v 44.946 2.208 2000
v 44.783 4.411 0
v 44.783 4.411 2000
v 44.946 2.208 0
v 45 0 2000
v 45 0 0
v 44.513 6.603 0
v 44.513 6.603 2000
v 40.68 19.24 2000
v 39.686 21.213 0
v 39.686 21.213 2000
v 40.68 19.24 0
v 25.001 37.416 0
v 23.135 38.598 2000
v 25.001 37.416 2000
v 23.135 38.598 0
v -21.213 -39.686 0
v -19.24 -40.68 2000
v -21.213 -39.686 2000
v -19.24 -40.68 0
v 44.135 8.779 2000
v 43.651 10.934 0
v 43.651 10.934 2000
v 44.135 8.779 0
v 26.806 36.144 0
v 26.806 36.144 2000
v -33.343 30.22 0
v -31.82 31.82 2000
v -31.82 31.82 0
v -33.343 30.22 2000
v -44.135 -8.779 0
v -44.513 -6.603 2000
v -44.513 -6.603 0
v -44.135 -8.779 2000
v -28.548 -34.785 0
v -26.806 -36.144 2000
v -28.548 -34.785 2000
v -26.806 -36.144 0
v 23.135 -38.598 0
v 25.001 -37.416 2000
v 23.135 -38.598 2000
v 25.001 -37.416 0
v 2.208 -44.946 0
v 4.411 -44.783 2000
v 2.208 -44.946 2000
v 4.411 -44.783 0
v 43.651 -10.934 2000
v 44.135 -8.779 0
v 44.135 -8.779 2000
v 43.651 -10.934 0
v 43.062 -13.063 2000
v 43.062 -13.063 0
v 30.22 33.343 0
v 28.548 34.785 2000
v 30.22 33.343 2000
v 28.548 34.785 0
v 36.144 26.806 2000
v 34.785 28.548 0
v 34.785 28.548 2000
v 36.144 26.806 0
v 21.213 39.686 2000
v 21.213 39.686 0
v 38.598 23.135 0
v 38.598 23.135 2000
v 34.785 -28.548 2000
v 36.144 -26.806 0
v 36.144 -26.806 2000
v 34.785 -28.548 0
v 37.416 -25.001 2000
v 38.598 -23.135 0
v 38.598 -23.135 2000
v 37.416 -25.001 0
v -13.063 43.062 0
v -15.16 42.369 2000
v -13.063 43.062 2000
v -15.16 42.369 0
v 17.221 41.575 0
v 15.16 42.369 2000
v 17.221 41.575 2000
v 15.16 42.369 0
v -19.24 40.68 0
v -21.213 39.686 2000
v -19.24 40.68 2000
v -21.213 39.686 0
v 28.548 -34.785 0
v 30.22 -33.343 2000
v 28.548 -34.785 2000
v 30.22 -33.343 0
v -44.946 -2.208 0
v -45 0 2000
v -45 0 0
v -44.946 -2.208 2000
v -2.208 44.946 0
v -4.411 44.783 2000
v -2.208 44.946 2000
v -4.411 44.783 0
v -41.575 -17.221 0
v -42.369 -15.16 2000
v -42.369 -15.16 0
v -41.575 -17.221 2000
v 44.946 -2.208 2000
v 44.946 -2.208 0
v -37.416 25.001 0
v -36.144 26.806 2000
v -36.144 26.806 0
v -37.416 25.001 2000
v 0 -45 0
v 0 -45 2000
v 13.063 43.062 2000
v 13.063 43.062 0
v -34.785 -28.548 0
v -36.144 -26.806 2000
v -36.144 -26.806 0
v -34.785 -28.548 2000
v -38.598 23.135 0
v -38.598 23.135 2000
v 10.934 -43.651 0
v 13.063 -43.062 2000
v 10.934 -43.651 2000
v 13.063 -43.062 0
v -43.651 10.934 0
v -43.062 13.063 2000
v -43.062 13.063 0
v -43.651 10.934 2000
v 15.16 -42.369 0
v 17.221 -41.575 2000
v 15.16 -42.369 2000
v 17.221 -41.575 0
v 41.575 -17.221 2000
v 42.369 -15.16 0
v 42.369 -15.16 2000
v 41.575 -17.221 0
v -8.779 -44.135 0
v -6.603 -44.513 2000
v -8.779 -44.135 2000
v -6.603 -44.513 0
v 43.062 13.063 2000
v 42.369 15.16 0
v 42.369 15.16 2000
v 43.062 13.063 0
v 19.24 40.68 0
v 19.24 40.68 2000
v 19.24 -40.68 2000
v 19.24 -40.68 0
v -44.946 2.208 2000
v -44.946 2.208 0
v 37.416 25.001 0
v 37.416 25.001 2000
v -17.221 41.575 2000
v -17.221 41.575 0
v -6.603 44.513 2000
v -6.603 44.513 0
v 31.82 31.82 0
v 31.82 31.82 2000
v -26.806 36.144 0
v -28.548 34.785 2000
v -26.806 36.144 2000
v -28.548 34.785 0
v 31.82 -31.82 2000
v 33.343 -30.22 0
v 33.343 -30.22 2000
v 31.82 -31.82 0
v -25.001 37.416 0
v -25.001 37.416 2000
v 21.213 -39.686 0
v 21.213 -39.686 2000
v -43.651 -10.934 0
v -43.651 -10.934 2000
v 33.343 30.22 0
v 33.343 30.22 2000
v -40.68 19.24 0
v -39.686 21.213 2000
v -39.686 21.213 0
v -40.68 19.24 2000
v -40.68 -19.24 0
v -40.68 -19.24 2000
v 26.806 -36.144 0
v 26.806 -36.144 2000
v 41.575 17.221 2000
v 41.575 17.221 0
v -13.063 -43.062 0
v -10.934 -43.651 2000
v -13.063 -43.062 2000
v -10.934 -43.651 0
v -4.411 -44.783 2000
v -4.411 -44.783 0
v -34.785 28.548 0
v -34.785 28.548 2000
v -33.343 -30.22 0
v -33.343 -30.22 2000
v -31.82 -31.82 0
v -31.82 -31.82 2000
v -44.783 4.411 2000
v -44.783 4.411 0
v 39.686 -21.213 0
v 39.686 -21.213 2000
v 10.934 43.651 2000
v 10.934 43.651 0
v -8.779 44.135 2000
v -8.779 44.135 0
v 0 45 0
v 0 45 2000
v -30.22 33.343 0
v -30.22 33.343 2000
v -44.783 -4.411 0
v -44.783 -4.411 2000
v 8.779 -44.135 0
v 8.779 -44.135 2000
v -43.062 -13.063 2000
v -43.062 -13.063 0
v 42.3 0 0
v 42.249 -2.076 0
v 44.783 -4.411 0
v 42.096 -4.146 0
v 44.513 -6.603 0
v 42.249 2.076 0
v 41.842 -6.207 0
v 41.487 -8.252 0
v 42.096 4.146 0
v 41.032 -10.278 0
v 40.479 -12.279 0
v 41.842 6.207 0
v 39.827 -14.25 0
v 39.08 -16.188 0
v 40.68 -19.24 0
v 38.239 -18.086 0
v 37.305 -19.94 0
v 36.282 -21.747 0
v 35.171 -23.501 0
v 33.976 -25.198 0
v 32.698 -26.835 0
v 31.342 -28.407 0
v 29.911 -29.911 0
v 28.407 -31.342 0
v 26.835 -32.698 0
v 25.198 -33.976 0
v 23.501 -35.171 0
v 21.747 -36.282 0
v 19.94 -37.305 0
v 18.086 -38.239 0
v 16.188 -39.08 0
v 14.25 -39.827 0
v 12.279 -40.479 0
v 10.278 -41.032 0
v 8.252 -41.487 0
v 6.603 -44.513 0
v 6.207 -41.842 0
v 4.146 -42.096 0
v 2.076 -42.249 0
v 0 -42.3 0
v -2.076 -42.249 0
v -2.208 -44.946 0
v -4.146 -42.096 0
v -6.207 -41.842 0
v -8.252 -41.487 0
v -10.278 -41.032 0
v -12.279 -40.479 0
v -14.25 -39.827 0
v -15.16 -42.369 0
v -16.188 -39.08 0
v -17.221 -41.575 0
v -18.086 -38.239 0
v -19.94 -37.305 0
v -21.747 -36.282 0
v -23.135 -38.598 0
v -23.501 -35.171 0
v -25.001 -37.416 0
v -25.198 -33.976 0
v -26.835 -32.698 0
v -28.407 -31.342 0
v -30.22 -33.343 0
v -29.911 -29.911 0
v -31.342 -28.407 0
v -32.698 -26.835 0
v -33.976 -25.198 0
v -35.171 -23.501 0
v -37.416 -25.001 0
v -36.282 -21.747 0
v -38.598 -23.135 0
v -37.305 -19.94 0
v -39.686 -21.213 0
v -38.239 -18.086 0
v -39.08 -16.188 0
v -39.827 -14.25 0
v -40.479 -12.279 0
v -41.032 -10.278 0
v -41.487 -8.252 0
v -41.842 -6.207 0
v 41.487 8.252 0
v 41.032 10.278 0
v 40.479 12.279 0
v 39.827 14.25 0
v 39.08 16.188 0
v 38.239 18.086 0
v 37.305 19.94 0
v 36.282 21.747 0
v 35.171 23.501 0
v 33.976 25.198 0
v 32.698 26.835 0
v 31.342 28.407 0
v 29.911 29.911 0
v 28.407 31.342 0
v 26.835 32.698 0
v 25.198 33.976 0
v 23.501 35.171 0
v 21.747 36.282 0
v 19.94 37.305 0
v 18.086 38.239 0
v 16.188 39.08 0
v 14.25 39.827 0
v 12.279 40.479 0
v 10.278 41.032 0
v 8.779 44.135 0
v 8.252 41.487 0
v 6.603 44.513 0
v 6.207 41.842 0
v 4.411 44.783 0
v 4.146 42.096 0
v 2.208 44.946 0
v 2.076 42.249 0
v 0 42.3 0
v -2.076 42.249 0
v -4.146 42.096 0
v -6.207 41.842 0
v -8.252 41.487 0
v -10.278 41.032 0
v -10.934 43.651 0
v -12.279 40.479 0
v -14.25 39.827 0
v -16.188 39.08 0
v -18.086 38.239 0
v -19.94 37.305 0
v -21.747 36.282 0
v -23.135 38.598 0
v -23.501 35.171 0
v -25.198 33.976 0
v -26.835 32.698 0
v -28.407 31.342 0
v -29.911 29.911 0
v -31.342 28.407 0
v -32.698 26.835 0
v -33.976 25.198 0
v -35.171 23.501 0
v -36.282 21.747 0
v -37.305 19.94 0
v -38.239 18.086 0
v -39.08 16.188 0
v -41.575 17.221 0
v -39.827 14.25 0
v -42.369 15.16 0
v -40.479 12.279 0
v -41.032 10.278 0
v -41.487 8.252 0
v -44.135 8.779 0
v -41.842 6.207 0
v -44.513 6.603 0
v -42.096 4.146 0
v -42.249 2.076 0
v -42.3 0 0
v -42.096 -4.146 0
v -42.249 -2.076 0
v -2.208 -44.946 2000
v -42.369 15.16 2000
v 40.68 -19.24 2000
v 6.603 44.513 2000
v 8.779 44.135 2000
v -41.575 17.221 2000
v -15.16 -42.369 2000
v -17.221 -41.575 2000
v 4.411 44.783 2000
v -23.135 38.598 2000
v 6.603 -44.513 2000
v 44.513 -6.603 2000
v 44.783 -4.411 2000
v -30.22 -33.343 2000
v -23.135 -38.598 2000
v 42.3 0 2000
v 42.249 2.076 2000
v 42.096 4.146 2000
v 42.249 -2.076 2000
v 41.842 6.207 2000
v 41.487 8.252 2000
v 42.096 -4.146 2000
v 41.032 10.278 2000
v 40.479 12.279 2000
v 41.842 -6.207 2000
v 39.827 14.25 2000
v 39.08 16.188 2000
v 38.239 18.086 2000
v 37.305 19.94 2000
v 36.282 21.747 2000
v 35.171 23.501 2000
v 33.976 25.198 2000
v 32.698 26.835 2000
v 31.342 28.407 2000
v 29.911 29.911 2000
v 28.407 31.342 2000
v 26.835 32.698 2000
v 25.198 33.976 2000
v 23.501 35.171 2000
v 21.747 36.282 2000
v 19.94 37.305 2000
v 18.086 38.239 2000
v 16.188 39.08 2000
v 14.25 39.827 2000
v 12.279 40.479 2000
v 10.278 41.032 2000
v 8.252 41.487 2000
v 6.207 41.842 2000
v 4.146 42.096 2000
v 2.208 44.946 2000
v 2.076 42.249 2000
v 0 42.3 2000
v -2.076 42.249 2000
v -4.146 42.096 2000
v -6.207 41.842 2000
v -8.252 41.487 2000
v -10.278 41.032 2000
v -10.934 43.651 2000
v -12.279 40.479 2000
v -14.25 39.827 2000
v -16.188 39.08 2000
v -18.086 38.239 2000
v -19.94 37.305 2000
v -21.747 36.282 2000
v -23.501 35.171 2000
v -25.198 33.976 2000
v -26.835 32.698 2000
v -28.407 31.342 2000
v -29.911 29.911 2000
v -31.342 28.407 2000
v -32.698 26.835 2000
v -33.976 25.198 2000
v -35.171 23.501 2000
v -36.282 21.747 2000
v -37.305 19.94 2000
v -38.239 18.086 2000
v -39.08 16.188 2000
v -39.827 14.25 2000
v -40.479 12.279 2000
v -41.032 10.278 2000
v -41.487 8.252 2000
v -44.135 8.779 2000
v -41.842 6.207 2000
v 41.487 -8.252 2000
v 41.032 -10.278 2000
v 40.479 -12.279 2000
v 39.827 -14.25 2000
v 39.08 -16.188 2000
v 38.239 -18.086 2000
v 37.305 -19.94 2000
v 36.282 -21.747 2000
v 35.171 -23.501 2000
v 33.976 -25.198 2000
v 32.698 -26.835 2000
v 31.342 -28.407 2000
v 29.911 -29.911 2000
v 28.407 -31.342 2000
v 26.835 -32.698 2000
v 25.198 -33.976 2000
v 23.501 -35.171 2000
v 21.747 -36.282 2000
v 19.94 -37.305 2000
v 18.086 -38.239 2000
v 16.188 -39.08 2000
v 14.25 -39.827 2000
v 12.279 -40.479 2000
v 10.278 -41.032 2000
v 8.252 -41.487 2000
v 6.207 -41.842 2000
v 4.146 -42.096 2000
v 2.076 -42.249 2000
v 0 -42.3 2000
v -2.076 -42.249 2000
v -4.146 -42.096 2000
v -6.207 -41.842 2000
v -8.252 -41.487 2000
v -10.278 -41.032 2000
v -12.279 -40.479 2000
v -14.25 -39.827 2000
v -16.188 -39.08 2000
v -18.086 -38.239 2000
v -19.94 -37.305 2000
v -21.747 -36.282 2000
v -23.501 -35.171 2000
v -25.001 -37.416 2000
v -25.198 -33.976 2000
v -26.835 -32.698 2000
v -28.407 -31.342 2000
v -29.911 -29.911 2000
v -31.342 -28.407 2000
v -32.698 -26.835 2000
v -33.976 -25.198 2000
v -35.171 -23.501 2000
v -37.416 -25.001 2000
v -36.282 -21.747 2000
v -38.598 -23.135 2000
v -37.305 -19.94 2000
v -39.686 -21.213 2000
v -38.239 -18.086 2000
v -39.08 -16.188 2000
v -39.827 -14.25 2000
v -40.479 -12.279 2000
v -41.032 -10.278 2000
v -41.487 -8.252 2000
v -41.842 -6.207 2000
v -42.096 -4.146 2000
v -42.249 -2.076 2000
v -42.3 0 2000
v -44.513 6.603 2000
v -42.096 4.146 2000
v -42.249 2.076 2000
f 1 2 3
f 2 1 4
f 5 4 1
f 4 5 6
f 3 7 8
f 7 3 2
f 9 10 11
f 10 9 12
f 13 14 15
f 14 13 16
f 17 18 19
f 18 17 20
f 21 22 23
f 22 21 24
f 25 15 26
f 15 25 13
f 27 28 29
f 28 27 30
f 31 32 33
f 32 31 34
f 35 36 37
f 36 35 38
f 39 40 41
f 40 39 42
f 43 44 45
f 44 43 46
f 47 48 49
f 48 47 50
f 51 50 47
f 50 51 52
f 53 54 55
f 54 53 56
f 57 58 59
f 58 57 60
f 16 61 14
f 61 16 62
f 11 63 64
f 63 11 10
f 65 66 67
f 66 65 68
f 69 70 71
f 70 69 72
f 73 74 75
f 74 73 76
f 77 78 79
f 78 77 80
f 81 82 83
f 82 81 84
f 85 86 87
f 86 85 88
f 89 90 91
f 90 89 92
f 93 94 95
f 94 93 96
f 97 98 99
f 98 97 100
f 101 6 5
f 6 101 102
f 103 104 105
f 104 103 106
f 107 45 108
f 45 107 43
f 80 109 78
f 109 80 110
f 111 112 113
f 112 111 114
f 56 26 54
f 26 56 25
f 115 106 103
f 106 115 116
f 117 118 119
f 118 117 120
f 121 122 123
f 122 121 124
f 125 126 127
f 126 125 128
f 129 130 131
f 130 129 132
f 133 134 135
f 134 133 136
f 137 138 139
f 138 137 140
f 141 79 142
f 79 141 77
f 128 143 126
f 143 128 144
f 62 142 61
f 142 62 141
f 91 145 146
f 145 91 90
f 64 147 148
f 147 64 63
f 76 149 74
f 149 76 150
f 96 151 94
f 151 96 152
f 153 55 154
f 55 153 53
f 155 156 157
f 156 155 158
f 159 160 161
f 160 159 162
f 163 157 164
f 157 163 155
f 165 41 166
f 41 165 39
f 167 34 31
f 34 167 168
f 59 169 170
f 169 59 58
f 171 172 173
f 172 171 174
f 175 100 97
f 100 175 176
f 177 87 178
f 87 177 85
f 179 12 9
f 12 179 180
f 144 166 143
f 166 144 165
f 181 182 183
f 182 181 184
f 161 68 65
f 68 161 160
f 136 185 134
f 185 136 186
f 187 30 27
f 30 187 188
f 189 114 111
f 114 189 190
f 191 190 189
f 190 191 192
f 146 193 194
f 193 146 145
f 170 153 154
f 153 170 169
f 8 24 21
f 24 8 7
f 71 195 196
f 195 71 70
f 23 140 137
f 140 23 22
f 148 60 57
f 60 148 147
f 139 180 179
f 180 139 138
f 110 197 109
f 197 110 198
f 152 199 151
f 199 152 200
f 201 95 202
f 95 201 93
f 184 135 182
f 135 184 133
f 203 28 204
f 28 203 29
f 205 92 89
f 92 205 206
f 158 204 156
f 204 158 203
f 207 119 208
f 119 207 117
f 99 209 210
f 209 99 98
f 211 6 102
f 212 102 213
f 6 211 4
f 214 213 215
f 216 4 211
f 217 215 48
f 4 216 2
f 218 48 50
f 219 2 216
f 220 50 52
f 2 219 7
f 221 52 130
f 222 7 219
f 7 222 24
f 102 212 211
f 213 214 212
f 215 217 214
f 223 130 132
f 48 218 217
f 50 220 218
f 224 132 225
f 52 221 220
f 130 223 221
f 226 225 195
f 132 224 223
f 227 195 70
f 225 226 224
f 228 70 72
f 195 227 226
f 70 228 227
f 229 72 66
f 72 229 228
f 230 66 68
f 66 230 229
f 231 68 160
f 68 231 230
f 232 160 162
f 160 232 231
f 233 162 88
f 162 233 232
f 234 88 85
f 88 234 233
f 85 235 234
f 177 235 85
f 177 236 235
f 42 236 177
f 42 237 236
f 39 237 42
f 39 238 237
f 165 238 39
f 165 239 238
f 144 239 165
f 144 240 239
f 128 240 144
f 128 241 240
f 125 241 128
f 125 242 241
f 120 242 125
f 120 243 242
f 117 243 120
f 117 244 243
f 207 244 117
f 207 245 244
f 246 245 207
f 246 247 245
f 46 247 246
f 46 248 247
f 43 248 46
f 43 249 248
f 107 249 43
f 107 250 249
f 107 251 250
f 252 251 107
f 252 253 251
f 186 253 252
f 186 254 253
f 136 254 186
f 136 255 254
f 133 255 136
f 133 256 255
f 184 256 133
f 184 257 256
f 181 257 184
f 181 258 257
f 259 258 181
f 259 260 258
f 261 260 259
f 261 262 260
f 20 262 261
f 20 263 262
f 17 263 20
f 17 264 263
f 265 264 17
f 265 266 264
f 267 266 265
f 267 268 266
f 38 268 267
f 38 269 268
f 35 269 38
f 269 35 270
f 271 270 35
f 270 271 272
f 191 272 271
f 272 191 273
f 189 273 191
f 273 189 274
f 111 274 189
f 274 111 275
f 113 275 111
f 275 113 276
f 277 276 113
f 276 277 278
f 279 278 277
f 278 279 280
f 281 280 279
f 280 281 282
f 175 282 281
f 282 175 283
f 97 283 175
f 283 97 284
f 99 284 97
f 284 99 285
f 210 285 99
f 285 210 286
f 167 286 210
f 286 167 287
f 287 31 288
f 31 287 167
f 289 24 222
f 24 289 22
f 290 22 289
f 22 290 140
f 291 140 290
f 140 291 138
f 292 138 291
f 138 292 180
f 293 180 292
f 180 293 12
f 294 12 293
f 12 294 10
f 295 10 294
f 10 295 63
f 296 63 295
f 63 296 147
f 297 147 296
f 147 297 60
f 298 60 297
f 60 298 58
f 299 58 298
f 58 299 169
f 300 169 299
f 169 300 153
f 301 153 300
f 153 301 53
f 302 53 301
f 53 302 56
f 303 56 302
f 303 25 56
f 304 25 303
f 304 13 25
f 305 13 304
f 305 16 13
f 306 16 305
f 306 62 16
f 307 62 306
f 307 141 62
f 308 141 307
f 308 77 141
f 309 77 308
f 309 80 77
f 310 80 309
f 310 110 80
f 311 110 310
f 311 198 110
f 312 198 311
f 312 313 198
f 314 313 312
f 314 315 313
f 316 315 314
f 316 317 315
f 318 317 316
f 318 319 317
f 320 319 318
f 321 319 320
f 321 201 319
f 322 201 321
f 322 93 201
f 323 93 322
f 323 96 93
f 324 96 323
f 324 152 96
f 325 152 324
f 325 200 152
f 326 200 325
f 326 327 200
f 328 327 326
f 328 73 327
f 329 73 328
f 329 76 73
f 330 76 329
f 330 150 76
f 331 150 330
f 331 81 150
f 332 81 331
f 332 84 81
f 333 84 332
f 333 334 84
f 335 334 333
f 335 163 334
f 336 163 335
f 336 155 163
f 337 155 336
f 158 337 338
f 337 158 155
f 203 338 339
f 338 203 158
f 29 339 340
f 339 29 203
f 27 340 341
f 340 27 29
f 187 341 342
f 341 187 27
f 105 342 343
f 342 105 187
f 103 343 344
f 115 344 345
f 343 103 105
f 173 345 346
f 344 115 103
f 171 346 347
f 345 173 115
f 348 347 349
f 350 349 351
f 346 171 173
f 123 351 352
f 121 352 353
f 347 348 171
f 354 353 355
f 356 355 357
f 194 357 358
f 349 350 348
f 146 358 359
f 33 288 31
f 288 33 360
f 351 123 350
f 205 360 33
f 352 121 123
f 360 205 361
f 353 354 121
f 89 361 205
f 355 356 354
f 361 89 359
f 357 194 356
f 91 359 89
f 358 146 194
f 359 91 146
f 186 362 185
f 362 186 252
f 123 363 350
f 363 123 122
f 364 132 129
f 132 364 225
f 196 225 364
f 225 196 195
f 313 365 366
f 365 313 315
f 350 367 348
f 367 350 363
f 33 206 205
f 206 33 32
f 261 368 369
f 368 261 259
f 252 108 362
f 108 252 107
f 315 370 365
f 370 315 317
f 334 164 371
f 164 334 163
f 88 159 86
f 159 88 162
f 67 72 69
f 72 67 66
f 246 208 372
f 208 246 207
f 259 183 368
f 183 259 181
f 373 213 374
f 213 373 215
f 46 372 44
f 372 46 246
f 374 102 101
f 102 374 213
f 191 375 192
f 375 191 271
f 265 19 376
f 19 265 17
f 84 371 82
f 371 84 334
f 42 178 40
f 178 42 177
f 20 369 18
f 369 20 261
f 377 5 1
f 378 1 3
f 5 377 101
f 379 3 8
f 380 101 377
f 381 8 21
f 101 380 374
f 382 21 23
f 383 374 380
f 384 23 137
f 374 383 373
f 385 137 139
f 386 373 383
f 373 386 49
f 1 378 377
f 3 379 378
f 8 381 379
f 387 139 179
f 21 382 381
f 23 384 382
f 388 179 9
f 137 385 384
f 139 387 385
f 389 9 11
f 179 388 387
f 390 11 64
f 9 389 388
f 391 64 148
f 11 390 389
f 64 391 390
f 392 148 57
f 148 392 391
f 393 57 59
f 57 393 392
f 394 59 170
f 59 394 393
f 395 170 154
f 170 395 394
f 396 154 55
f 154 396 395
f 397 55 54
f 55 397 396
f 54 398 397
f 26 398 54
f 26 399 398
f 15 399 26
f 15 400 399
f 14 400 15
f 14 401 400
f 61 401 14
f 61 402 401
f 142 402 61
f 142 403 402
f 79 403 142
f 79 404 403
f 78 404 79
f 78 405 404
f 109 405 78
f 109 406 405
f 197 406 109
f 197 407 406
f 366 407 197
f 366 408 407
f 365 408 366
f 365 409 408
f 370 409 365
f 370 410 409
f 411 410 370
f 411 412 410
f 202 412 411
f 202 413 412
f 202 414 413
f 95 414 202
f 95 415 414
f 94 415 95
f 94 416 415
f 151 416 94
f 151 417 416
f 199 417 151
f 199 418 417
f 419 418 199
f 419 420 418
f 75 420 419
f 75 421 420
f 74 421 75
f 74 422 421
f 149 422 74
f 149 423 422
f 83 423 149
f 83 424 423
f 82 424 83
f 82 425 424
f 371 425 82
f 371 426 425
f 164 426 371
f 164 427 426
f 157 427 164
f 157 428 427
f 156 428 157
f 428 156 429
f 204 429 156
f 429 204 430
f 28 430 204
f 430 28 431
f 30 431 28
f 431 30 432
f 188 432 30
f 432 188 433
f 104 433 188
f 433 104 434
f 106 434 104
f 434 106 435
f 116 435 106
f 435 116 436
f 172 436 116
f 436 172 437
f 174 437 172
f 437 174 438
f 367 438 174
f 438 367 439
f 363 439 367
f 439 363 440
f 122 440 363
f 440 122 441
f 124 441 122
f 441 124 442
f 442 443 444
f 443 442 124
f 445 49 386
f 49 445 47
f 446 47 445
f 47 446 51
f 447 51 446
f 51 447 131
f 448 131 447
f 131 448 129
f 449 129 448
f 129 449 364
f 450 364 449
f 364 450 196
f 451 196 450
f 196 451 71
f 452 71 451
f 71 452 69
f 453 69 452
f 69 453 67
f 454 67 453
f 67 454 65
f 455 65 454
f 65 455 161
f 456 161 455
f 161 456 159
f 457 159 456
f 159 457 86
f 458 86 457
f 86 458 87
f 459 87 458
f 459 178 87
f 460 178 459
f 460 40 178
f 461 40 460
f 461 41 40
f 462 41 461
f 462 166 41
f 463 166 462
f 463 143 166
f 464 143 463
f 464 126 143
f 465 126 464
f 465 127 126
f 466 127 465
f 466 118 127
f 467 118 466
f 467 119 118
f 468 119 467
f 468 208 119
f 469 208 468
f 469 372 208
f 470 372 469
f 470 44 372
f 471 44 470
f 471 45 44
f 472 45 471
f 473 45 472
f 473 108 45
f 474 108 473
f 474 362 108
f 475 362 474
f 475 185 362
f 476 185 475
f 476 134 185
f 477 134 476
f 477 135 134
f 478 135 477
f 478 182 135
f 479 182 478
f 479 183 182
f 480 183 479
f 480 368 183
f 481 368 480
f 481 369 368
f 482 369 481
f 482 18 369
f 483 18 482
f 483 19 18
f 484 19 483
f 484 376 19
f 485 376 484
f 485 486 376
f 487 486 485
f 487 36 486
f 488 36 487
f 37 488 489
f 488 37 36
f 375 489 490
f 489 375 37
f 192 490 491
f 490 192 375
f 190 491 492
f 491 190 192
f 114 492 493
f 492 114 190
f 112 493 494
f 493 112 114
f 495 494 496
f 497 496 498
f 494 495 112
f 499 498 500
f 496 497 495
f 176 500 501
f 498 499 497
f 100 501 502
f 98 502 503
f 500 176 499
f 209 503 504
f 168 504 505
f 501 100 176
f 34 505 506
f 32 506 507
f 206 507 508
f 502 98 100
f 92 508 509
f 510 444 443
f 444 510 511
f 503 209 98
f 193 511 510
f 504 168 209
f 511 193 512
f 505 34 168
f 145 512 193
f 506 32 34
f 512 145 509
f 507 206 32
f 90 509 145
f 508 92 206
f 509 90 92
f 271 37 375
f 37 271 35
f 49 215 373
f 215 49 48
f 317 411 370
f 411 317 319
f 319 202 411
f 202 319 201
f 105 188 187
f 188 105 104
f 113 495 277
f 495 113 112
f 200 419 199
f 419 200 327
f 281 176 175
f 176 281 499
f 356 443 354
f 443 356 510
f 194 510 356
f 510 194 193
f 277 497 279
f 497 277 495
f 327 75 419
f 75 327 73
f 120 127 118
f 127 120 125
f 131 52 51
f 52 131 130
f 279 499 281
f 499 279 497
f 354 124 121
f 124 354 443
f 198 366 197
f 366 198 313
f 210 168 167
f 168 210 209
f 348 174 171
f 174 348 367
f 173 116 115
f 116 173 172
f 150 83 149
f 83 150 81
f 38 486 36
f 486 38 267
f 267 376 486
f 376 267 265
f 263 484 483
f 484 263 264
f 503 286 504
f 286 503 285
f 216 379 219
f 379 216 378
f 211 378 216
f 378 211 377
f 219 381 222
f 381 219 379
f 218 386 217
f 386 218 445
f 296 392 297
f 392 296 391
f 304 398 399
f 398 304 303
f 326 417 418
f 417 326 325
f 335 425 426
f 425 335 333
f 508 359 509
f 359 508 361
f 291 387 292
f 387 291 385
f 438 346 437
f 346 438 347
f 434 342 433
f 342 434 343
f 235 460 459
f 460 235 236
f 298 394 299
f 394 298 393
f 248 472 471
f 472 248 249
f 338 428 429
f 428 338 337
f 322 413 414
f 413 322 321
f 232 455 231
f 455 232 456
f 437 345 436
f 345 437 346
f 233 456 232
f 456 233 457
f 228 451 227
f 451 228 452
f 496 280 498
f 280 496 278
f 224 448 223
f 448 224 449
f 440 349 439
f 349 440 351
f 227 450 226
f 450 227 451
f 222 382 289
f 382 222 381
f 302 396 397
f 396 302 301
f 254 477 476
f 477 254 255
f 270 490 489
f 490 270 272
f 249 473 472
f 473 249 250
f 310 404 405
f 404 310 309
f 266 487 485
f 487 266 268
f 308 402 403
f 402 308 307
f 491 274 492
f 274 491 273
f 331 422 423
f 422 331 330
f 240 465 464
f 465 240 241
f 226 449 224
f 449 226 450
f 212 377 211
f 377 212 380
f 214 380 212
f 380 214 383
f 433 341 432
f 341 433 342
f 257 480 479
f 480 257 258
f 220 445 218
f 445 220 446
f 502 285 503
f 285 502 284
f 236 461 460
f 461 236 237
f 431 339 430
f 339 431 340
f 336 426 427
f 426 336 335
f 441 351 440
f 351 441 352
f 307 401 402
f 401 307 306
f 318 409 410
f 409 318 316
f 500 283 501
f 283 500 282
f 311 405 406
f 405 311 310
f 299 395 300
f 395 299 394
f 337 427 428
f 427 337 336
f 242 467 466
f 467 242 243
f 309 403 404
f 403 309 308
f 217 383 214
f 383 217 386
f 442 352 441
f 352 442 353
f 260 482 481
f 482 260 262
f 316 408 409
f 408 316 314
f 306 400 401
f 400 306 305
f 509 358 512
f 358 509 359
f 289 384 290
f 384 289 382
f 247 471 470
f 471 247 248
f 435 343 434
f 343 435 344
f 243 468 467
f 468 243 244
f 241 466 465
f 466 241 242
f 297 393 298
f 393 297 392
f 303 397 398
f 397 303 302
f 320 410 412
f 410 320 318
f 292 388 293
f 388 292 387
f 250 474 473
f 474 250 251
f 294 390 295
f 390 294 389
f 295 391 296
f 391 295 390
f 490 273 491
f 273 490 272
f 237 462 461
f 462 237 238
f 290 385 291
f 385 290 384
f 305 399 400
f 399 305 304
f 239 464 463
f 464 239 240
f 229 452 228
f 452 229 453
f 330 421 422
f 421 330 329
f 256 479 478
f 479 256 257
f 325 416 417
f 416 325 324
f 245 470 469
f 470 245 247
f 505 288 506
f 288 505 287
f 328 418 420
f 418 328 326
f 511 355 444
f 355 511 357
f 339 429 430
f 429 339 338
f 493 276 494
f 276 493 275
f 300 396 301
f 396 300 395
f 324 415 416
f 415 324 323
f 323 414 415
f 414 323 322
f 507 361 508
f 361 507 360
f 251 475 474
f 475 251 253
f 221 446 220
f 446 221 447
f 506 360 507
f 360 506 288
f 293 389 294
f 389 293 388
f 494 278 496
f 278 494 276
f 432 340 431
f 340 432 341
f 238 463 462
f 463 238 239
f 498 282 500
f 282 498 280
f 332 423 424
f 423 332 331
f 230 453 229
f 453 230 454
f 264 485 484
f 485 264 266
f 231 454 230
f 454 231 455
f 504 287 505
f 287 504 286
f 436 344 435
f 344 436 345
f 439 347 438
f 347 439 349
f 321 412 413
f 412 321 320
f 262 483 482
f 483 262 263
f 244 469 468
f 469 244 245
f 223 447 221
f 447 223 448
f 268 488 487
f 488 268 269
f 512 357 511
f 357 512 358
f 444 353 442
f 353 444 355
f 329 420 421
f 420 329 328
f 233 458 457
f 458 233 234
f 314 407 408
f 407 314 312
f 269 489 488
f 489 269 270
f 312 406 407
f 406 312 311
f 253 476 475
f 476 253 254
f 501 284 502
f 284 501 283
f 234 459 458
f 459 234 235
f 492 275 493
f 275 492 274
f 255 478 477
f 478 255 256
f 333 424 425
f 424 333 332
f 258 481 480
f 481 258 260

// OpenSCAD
$fn = 128;

// HT 90 pipe 2000 mm (interpreted as: DN90 sewer pipe, 2000 mm length)
// Typical HT DN90 dimensions (approx):
// - Outer diameter: 90 mm
// - Wall thickness: 2.7 mm
// Adjust as needed.
od = 90;
t  = 2.7;
id = od - 2*t;
L  = 2000;

module ht_pipe(od, id, L) {
    difference() {
        cylinder(h=L, d=od);
        translate([0,0,-0.5])
            cylinder(h=L+1, d=id);
    }
}

ht_pipe(od, id, L);
